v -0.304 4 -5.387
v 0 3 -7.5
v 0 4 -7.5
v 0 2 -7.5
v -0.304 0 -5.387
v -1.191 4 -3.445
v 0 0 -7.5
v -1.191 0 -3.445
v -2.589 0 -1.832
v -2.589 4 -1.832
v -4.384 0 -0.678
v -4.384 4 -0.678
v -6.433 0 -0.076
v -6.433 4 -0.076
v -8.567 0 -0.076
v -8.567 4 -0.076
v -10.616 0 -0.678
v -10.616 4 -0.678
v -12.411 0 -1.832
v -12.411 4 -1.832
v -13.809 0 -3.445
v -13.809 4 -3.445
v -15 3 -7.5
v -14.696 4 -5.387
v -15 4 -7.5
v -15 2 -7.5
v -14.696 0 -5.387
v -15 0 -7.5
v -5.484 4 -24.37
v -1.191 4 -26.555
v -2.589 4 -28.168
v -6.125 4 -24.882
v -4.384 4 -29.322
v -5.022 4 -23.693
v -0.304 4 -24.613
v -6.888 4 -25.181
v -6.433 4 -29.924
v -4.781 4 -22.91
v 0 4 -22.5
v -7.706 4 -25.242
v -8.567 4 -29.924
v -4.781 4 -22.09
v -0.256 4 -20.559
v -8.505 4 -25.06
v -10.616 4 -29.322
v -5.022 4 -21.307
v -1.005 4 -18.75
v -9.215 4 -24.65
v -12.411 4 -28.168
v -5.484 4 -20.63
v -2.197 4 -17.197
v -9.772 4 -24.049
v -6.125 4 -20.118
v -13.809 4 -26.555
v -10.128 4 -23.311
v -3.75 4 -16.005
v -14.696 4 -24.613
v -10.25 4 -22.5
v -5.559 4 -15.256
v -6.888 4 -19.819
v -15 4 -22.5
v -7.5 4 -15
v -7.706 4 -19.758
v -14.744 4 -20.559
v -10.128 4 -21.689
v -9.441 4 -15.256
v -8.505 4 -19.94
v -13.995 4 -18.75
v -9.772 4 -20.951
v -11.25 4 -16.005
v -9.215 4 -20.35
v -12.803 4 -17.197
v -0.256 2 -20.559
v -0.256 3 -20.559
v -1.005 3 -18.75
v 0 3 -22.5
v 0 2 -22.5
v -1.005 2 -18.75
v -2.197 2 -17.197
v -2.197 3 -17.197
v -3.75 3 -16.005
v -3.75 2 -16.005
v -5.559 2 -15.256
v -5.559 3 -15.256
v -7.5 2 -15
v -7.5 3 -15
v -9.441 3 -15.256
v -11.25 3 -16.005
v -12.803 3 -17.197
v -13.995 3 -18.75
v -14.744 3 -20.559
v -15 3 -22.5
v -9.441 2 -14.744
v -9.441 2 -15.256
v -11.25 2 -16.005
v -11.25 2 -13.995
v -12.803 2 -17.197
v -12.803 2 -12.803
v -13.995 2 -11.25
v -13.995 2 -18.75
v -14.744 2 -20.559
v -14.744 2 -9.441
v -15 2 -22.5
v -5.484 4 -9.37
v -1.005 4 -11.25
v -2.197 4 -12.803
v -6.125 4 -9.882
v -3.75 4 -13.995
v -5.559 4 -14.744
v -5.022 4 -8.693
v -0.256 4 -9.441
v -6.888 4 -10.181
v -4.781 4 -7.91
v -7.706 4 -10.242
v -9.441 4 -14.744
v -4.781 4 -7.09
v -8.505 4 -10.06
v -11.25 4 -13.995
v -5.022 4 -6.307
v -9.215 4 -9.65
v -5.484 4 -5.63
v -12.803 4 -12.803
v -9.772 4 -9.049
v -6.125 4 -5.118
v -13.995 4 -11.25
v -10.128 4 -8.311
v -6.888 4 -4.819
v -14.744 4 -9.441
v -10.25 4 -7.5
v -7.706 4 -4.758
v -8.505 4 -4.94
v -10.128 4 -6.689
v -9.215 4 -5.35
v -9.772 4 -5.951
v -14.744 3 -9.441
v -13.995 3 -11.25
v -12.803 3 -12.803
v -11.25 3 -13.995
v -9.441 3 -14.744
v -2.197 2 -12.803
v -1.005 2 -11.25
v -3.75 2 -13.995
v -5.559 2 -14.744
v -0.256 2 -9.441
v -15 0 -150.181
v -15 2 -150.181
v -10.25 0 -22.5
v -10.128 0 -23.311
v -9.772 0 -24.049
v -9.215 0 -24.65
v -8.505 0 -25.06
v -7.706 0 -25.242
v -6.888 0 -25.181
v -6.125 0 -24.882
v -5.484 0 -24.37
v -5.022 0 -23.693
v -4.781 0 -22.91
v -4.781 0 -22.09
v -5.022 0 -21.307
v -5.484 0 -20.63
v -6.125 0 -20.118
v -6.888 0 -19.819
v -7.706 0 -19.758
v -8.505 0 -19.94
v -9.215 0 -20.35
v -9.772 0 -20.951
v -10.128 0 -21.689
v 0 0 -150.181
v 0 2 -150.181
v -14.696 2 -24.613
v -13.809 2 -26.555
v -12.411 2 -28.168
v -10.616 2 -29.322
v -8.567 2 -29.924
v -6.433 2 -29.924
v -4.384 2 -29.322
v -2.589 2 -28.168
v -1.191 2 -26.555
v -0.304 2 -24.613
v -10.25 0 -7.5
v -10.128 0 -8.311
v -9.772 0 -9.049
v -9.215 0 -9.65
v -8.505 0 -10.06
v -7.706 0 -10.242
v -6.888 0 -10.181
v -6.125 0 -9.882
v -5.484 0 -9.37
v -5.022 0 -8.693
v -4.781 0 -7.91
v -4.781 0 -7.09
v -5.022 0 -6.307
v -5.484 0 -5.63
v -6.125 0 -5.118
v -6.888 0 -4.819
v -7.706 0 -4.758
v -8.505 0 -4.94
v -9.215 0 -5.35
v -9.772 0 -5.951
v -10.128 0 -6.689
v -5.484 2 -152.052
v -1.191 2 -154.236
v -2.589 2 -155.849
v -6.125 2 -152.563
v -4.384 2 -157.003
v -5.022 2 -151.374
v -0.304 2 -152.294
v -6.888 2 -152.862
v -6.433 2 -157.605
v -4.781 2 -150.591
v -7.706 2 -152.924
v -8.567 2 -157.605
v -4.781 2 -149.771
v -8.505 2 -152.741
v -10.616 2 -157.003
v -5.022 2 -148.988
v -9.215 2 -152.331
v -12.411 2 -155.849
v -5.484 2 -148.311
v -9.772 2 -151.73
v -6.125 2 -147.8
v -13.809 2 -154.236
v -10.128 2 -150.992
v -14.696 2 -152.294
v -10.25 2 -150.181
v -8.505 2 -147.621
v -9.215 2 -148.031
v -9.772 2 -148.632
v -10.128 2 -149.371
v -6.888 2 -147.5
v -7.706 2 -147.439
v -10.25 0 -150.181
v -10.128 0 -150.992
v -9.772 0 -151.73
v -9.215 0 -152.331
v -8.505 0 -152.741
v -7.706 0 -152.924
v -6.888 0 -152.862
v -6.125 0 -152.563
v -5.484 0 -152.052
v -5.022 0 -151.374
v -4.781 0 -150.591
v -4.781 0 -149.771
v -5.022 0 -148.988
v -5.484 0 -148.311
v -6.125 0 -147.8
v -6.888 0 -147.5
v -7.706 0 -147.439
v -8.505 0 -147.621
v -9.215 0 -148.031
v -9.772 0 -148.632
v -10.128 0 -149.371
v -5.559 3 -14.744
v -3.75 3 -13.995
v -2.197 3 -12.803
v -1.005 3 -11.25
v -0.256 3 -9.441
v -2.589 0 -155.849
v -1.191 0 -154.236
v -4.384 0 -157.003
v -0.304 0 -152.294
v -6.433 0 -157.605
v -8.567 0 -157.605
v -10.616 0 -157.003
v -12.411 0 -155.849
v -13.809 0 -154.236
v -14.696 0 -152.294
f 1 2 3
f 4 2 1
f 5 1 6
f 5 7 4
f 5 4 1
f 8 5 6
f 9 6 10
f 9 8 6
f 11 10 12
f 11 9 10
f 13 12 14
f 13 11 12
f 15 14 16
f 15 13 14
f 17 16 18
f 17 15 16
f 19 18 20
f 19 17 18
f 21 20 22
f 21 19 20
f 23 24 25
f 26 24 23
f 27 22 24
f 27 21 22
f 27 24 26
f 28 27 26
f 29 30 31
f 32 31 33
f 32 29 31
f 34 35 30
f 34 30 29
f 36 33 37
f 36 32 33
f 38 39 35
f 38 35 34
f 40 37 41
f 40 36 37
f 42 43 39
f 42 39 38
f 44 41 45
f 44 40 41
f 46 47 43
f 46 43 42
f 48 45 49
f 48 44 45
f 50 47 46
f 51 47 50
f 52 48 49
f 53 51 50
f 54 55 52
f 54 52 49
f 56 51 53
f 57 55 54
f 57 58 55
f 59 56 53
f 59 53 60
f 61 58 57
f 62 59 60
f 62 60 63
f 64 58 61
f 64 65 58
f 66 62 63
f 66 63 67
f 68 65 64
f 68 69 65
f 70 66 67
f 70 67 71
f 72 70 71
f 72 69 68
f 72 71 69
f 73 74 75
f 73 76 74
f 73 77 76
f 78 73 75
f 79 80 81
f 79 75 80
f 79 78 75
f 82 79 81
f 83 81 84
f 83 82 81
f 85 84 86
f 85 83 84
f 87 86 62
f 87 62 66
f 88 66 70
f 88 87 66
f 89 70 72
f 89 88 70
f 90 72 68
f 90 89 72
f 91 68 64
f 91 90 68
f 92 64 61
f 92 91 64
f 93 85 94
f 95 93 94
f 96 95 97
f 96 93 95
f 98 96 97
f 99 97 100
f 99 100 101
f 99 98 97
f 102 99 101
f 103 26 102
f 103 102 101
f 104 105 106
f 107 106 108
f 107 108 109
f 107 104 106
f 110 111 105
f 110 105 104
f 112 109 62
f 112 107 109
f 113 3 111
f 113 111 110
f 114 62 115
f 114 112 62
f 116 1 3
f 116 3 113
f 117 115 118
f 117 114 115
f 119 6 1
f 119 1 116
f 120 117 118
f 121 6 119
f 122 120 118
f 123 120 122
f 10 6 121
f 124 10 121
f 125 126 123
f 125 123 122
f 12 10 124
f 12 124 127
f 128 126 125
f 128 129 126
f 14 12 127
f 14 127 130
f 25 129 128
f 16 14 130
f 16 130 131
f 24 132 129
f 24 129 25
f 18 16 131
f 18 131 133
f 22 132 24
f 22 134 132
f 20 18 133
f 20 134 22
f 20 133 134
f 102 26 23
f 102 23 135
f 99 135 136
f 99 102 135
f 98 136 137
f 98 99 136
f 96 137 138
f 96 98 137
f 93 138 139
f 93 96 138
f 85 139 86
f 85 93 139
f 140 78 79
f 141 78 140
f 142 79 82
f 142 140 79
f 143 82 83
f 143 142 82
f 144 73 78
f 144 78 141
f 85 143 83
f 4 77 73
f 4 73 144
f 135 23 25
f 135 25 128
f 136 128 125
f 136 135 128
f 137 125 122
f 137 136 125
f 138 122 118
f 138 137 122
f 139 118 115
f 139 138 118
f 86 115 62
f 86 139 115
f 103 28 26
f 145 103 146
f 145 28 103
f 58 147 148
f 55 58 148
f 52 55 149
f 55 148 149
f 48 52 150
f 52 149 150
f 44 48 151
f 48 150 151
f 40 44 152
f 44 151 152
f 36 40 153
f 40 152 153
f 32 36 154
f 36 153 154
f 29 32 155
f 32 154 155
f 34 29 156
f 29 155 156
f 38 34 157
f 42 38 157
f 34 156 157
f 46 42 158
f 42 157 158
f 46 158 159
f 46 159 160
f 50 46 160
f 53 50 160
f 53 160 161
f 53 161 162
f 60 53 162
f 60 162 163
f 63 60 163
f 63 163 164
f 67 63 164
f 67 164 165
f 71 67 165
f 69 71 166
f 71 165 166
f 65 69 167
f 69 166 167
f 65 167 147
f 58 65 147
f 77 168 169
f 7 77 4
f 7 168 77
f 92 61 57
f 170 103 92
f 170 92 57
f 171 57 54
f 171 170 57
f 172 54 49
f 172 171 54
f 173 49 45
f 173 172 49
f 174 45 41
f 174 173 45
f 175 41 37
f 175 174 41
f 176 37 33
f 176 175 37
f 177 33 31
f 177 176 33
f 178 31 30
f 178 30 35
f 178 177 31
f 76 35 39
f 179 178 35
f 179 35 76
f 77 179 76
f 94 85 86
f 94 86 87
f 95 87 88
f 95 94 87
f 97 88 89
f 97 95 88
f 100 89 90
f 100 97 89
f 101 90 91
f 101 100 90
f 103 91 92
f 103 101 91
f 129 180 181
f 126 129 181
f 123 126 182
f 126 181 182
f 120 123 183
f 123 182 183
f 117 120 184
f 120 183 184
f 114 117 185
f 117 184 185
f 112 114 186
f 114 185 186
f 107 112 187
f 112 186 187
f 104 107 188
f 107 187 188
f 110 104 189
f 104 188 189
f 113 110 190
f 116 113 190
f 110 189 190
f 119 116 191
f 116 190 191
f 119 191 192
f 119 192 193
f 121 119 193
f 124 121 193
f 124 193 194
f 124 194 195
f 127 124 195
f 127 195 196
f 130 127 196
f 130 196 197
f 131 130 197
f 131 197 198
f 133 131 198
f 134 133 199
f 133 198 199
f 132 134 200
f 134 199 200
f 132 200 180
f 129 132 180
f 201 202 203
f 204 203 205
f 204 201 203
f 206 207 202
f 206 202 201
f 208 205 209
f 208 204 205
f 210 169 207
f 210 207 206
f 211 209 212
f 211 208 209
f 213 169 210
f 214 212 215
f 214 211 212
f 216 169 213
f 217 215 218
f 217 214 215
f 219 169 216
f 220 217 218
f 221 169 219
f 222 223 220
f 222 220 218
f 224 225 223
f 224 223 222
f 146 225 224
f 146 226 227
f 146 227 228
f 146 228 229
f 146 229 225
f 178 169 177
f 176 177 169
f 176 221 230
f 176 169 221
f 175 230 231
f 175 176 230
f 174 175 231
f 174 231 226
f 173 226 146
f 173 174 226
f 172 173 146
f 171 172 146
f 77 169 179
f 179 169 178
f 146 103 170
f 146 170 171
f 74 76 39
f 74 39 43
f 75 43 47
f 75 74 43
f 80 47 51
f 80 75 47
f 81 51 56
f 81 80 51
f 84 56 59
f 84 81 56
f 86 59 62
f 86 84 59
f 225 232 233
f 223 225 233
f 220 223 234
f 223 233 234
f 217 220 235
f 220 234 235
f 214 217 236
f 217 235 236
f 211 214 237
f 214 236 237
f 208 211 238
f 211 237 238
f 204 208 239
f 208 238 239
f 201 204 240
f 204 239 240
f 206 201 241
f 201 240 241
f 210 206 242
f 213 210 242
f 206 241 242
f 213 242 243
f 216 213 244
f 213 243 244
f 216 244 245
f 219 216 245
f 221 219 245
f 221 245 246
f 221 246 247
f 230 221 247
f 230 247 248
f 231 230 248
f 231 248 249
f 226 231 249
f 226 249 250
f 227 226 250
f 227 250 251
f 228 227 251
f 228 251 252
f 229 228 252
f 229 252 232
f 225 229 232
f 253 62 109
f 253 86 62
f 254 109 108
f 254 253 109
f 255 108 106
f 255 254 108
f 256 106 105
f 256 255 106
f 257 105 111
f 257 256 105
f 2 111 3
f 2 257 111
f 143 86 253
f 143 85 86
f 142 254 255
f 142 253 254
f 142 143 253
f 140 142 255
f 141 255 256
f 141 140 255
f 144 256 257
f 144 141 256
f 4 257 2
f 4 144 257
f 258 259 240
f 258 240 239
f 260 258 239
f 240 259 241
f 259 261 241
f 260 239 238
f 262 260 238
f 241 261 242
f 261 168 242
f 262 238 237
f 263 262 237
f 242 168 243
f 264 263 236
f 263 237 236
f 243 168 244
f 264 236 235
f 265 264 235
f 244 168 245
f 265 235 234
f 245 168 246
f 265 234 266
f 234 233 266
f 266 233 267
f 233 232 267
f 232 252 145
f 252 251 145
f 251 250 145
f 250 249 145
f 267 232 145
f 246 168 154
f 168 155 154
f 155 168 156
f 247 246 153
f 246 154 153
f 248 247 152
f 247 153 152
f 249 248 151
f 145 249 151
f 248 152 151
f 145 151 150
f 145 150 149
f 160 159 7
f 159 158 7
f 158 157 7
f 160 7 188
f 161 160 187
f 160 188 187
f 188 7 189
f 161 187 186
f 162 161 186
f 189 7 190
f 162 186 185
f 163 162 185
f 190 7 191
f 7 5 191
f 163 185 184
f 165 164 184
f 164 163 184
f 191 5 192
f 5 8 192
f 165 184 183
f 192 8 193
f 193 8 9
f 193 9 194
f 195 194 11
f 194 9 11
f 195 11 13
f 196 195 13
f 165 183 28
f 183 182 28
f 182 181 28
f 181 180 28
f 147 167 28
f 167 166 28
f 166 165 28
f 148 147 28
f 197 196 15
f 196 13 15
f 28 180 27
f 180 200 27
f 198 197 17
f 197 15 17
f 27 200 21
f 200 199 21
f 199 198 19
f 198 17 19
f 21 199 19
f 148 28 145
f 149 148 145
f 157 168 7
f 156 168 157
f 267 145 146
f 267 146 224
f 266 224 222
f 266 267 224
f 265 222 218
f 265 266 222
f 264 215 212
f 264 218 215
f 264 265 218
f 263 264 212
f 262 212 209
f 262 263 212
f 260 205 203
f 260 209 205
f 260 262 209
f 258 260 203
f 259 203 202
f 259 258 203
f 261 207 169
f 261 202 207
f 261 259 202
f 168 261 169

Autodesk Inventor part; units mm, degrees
ref_plane "YZ Plane" through (0, 0, 0) normal (1, 0, 0) x (0, 1, 0)
ref_plane "XZ Plane" through (0, 0, 0) normal (0, 1, 0) x (-1, 0, 0)
ref_plane "XY Plane" through (0, 0, 0) normal (0, 0, 1) x (1, 0, 0)
sketch "Sketch1" plane through (0, 0, 0) normal (0, 1, 0) x (-1, 0, 0)
  line L0 (0, 0) -> (15, 0)
  line L1 (15, 0) -> (15, -30)
  line L2 (15, -30) -> (0, -30)
  line L3 (0, -30) -> (0, 0)
  line L4 (7.5, 0) -> (7.5, -157.6812)
  line L5 (7.5, 0) -> (165.1812, 0) construction
  line L6 (7.5, -157.6812) -> (7.5, -150.1812)
  circle A0 centre (7.5, -150.1812) radius 7.5
  circle A1 centre (7.5, -7.5) radius 7.5
  circle A2 centre (7.5, -22.5) radius 7.5
  circle A3 centre (7.5, -7.5) radius 2.75
  line L7 (15, 0) -> (0, 0)
  line L8 (0, 0) -> (0, -157.6812)
  line L9 (0, -157.6812) -> (15, -157.6812)
  line L10 (15, -157.6812) -> (15, 0)
  circle A4 centre (7.5, -150.1812) radius 2.75
  circle A5 centre (7.5, -22.5) radius 2.75
  point P0 (0, -150.1812)
  point P1 (15, -150.1812)
  point P2 (15, -7.5)
  point P3 (0, -7.5)
  point P4 (7.5, -15)
  dimension "d9" = 15
  dimension "d10" = 30
  dimension "d11" = 157.6812
  dimension "d12" = 90
  dimension "d13" = 7.5
  dimension "d14" = 15
  dimension "d15" = 15
  dimension "d16" = 15
  dimension "d17" = 5.5
  dimension "d18" = 5.5
  dimension "d19" = 5.5
extrude "Extrusion1" add sketch "Sketch1" along normal blind 2 contours A1 L4 A3 | L4 A3 A1 | A1 A2 L3 | L1 A2 A1 | A2 L2 L3 | A2 L4 A5 | A2 L4 A5 | L1 L2 A2 | L2 L4 A0 L8 | L2 L10 A0 L4 | A0 L4 A4 | A0 L4 A4
extrude "Extrusion2" add sketch "Sketch1" along normal blind 3 contours A1 L4 A3 | L4 A3 A1 | A2 L4 A5 | A2 L4 A5
extrude "Extrusion3" cut sketch "Sketch1" along normal mid plane 2 contours A3 L4 | L4 A3 | A5 L4 | L4 A5 | A4 L4 | L4 A4
extrude "Extrusion4" add sketch "Sketch1" along normal blind 4 contours A1 L4 A3 | L4 A3 A1 | A2 L4 A5 | A2 L4 A5
properties part number "közeplsoszalag1"
